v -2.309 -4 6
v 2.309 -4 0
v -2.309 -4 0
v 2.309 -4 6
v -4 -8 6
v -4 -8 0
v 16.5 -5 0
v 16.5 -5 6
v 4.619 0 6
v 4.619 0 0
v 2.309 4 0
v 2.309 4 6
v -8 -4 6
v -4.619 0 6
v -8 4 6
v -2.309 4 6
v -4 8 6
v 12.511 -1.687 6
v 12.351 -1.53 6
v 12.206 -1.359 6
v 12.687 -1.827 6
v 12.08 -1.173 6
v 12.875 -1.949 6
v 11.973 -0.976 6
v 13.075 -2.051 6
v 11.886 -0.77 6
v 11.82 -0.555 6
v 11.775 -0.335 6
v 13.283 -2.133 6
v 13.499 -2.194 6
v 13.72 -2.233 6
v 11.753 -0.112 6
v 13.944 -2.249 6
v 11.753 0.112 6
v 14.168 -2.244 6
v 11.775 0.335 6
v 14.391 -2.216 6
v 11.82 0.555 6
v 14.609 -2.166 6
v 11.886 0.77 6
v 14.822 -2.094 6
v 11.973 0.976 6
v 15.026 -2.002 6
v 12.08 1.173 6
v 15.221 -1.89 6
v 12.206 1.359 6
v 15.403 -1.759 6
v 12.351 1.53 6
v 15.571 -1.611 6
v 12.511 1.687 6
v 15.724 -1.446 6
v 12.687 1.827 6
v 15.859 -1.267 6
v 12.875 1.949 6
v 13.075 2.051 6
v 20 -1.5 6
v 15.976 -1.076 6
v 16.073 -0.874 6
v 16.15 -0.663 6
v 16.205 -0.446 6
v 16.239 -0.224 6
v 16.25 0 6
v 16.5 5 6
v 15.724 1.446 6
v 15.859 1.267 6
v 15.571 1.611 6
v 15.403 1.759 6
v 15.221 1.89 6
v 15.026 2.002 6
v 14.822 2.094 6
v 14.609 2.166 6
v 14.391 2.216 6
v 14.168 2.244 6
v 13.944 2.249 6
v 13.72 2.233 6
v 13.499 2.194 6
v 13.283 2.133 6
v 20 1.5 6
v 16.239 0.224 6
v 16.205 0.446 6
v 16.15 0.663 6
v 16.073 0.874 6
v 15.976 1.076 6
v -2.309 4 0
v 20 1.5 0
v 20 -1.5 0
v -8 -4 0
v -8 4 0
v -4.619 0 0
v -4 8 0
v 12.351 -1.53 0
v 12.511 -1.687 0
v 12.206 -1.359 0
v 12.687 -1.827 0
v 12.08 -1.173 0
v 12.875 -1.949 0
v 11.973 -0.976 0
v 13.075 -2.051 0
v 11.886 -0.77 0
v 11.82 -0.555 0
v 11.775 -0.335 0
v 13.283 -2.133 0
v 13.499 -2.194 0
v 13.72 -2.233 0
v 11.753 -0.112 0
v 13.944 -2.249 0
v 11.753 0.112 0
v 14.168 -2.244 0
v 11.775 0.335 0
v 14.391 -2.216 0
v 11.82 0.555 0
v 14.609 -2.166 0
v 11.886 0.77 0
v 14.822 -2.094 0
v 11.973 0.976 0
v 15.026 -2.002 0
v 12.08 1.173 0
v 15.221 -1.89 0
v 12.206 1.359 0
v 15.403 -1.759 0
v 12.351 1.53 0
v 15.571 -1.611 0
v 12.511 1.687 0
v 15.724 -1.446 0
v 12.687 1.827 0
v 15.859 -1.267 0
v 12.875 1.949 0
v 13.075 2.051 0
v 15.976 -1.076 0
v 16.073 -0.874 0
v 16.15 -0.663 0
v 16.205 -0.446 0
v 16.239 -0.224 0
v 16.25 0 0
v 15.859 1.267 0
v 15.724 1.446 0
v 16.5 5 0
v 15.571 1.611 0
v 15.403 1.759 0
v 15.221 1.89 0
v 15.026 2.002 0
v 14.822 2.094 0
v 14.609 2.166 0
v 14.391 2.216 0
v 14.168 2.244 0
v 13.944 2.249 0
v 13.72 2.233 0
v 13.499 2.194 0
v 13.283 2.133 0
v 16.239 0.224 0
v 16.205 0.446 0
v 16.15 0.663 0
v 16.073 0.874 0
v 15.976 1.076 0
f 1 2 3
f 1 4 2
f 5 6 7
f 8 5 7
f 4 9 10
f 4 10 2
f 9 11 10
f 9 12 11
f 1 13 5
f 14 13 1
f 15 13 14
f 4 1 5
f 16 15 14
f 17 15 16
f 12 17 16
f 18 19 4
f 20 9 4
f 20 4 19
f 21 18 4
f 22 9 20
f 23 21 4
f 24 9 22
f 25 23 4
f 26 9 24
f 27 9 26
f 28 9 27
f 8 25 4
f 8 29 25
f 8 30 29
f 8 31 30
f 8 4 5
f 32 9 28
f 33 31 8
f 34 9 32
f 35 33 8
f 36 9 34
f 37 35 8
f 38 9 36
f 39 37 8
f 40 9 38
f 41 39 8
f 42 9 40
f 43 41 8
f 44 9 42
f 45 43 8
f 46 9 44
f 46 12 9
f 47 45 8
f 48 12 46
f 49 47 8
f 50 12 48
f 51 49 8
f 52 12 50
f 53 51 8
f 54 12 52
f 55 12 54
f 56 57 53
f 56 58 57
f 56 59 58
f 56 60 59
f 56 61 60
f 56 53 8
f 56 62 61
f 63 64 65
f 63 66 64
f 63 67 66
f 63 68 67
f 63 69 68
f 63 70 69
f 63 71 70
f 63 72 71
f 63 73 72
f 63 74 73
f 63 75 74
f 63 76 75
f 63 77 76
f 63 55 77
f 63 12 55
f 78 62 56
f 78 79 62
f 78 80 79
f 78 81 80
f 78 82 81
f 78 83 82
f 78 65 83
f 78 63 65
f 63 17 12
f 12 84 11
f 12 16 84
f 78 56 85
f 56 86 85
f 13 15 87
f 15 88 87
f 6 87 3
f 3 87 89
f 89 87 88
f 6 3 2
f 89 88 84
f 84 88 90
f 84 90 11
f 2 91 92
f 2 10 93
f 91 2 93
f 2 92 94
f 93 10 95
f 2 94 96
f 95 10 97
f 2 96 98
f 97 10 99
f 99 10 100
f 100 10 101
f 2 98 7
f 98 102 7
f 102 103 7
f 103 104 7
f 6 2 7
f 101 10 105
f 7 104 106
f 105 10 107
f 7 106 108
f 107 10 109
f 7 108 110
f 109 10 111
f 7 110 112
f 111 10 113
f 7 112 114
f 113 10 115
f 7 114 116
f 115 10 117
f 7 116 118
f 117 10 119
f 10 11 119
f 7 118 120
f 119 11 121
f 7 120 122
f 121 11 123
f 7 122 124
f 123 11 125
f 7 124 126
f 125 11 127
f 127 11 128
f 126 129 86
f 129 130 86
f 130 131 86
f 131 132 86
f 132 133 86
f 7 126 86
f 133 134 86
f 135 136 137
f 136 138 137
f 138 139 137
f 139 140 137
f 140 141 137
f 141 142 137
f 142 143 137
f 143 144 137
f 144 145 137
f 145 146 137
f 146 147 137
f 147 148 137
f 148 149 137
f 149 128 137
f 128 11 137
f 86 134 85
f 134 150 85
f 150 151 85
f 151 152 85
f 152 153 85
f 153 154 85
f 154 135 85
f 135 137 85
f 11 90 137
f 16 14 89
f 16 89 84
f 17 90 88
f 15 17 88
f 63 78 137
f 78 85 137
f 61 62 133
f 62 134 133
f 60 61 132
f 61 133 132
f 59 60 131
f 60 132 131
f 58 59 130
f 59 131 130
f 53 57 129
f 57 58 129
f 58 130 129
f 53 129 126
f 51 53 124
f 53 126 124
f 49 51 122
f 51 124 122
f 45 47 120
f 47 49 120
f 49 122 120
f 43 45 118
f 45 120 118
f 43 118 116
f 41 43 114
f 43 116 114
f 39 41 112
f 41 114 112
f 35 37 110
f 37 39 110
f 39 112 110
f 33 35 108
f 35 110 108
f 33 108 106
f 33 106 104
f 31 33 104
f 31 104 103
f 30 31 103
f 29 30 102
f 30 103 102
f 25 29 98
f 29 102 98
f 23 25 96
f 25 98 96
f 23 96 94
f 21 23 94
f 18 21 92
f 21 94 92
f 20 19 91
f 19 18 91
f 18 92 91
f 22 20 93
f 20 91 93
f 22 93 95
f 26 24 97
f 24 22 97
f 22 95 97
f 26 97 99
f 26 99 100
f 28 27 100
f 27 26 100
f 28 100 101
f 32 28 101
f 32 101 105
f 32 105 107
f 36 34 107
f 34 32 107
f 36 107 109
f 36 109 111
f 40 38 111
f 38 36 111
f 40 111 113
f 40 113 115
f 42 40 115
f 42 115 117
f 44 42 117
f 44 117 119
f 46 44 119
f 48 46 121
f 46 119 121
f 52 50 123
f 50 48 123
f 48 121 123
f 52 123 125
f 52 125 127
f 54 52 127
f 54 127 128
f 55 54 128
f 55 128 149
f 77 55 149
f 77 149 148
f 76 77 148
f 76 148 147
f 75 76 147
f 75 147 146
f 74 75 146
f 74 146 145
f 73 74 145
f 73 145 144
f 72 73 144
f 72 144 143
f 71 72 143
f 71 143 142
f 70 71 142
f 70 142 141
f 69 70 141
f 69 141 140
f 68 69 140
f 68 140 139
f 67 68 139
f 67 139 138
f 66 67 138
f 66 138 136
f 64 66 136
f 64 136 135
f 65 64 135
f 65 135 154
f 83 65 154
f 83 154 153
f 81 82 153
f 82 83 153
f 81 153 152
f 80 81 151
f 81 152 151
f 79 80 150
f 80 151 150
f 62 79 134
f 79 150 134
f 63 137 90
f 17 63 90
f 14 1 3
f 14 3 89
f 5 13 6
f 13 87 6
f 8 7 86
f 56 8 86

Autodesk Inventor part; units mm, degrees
ref_plane "YZ Plane" through (0, 0, 0) normal (1, 0, 0) x (0, 1, 0)
ref_plane "XZ Plane" through (0, 0, 0) normal (0, 1, 0) x (-1, 0, 0)
ref_plane "XY Plane" through (0, 0, 0) normal (0, 0, 1) x (1, 0, 0)
sketch "Sketch1" plane through (0, 0, 0) normal (0, 0, 1) x (1, 0, 0)
  line L0 (-4, -8) -> (16.5, -5)
  line L1 (20, -1.5) -> (20, 1.5)
  line L2 (16.5, 5) -> (-4, 8)
  line L3 (-8, 4) -> (-8, -4)
  line L4 (-4, 8) -> (-8, 4)
  line L5 (-8, -4) -> (-4, -8)
  line L6 (16.5, -5) -> (20, -1.5)
  line L7 (20, 1.5) -> (16.5, 5)
  circle A0 centre (0, 0) radius 2.75
  circle A1 centre (14, 0) radius 2.25
  circle A2 centre (0, 0) radius 5 construction
  circle A3 centre (14, 0) radius 4.5 construction
  point P0 (-8, 0)
  point P1 (20, 0)
  dimension "d9" = 8
  dimension "d10" = 14
  dimension "d11" = 4.5
  dimension "d12" = 5.5
  dimension "d13" = 6
  dimension "d16" = 10
  dimension "d17" = 9
  dimension "d18" = 8
  dimension "d19" = 4
  dimension "d20" = 4
  dimension "d21" = 4
  dimension "d22" = 10
  dimension "d23" = 3
extrude "Extrusion1" add sketch "Sketch1" along normal blind 6
sketch "Sketch2" plane through (0, 0, 6) normal (0, 0, 1) x (1, 0, 0)
  circle A0 centre (0, 0) radius 2.75 projected
  line L0 (-8, 4) -> (-8, -4) projected
  line L1 (4.6188, 0) -> (2.3094, -4)
  line L2 (2.3094, -4) -> (-2.3094, -4)
  line L3 (-2.3094, -4) -> (-4.6188, 0)
  line L4 (-4.6188, 0) -> (-2.3094, 4)
  line L5 (-2.3094, 4) -> (2.3094, 4)
  line L6 (2.3094, 4) -> (4.6188, 0)
  dimension "d24" = 8
extrude "Extrusion2" cut sketch "Sketch2" against normal blind 6
properties part number "y_carriage_nut_holder_a"
